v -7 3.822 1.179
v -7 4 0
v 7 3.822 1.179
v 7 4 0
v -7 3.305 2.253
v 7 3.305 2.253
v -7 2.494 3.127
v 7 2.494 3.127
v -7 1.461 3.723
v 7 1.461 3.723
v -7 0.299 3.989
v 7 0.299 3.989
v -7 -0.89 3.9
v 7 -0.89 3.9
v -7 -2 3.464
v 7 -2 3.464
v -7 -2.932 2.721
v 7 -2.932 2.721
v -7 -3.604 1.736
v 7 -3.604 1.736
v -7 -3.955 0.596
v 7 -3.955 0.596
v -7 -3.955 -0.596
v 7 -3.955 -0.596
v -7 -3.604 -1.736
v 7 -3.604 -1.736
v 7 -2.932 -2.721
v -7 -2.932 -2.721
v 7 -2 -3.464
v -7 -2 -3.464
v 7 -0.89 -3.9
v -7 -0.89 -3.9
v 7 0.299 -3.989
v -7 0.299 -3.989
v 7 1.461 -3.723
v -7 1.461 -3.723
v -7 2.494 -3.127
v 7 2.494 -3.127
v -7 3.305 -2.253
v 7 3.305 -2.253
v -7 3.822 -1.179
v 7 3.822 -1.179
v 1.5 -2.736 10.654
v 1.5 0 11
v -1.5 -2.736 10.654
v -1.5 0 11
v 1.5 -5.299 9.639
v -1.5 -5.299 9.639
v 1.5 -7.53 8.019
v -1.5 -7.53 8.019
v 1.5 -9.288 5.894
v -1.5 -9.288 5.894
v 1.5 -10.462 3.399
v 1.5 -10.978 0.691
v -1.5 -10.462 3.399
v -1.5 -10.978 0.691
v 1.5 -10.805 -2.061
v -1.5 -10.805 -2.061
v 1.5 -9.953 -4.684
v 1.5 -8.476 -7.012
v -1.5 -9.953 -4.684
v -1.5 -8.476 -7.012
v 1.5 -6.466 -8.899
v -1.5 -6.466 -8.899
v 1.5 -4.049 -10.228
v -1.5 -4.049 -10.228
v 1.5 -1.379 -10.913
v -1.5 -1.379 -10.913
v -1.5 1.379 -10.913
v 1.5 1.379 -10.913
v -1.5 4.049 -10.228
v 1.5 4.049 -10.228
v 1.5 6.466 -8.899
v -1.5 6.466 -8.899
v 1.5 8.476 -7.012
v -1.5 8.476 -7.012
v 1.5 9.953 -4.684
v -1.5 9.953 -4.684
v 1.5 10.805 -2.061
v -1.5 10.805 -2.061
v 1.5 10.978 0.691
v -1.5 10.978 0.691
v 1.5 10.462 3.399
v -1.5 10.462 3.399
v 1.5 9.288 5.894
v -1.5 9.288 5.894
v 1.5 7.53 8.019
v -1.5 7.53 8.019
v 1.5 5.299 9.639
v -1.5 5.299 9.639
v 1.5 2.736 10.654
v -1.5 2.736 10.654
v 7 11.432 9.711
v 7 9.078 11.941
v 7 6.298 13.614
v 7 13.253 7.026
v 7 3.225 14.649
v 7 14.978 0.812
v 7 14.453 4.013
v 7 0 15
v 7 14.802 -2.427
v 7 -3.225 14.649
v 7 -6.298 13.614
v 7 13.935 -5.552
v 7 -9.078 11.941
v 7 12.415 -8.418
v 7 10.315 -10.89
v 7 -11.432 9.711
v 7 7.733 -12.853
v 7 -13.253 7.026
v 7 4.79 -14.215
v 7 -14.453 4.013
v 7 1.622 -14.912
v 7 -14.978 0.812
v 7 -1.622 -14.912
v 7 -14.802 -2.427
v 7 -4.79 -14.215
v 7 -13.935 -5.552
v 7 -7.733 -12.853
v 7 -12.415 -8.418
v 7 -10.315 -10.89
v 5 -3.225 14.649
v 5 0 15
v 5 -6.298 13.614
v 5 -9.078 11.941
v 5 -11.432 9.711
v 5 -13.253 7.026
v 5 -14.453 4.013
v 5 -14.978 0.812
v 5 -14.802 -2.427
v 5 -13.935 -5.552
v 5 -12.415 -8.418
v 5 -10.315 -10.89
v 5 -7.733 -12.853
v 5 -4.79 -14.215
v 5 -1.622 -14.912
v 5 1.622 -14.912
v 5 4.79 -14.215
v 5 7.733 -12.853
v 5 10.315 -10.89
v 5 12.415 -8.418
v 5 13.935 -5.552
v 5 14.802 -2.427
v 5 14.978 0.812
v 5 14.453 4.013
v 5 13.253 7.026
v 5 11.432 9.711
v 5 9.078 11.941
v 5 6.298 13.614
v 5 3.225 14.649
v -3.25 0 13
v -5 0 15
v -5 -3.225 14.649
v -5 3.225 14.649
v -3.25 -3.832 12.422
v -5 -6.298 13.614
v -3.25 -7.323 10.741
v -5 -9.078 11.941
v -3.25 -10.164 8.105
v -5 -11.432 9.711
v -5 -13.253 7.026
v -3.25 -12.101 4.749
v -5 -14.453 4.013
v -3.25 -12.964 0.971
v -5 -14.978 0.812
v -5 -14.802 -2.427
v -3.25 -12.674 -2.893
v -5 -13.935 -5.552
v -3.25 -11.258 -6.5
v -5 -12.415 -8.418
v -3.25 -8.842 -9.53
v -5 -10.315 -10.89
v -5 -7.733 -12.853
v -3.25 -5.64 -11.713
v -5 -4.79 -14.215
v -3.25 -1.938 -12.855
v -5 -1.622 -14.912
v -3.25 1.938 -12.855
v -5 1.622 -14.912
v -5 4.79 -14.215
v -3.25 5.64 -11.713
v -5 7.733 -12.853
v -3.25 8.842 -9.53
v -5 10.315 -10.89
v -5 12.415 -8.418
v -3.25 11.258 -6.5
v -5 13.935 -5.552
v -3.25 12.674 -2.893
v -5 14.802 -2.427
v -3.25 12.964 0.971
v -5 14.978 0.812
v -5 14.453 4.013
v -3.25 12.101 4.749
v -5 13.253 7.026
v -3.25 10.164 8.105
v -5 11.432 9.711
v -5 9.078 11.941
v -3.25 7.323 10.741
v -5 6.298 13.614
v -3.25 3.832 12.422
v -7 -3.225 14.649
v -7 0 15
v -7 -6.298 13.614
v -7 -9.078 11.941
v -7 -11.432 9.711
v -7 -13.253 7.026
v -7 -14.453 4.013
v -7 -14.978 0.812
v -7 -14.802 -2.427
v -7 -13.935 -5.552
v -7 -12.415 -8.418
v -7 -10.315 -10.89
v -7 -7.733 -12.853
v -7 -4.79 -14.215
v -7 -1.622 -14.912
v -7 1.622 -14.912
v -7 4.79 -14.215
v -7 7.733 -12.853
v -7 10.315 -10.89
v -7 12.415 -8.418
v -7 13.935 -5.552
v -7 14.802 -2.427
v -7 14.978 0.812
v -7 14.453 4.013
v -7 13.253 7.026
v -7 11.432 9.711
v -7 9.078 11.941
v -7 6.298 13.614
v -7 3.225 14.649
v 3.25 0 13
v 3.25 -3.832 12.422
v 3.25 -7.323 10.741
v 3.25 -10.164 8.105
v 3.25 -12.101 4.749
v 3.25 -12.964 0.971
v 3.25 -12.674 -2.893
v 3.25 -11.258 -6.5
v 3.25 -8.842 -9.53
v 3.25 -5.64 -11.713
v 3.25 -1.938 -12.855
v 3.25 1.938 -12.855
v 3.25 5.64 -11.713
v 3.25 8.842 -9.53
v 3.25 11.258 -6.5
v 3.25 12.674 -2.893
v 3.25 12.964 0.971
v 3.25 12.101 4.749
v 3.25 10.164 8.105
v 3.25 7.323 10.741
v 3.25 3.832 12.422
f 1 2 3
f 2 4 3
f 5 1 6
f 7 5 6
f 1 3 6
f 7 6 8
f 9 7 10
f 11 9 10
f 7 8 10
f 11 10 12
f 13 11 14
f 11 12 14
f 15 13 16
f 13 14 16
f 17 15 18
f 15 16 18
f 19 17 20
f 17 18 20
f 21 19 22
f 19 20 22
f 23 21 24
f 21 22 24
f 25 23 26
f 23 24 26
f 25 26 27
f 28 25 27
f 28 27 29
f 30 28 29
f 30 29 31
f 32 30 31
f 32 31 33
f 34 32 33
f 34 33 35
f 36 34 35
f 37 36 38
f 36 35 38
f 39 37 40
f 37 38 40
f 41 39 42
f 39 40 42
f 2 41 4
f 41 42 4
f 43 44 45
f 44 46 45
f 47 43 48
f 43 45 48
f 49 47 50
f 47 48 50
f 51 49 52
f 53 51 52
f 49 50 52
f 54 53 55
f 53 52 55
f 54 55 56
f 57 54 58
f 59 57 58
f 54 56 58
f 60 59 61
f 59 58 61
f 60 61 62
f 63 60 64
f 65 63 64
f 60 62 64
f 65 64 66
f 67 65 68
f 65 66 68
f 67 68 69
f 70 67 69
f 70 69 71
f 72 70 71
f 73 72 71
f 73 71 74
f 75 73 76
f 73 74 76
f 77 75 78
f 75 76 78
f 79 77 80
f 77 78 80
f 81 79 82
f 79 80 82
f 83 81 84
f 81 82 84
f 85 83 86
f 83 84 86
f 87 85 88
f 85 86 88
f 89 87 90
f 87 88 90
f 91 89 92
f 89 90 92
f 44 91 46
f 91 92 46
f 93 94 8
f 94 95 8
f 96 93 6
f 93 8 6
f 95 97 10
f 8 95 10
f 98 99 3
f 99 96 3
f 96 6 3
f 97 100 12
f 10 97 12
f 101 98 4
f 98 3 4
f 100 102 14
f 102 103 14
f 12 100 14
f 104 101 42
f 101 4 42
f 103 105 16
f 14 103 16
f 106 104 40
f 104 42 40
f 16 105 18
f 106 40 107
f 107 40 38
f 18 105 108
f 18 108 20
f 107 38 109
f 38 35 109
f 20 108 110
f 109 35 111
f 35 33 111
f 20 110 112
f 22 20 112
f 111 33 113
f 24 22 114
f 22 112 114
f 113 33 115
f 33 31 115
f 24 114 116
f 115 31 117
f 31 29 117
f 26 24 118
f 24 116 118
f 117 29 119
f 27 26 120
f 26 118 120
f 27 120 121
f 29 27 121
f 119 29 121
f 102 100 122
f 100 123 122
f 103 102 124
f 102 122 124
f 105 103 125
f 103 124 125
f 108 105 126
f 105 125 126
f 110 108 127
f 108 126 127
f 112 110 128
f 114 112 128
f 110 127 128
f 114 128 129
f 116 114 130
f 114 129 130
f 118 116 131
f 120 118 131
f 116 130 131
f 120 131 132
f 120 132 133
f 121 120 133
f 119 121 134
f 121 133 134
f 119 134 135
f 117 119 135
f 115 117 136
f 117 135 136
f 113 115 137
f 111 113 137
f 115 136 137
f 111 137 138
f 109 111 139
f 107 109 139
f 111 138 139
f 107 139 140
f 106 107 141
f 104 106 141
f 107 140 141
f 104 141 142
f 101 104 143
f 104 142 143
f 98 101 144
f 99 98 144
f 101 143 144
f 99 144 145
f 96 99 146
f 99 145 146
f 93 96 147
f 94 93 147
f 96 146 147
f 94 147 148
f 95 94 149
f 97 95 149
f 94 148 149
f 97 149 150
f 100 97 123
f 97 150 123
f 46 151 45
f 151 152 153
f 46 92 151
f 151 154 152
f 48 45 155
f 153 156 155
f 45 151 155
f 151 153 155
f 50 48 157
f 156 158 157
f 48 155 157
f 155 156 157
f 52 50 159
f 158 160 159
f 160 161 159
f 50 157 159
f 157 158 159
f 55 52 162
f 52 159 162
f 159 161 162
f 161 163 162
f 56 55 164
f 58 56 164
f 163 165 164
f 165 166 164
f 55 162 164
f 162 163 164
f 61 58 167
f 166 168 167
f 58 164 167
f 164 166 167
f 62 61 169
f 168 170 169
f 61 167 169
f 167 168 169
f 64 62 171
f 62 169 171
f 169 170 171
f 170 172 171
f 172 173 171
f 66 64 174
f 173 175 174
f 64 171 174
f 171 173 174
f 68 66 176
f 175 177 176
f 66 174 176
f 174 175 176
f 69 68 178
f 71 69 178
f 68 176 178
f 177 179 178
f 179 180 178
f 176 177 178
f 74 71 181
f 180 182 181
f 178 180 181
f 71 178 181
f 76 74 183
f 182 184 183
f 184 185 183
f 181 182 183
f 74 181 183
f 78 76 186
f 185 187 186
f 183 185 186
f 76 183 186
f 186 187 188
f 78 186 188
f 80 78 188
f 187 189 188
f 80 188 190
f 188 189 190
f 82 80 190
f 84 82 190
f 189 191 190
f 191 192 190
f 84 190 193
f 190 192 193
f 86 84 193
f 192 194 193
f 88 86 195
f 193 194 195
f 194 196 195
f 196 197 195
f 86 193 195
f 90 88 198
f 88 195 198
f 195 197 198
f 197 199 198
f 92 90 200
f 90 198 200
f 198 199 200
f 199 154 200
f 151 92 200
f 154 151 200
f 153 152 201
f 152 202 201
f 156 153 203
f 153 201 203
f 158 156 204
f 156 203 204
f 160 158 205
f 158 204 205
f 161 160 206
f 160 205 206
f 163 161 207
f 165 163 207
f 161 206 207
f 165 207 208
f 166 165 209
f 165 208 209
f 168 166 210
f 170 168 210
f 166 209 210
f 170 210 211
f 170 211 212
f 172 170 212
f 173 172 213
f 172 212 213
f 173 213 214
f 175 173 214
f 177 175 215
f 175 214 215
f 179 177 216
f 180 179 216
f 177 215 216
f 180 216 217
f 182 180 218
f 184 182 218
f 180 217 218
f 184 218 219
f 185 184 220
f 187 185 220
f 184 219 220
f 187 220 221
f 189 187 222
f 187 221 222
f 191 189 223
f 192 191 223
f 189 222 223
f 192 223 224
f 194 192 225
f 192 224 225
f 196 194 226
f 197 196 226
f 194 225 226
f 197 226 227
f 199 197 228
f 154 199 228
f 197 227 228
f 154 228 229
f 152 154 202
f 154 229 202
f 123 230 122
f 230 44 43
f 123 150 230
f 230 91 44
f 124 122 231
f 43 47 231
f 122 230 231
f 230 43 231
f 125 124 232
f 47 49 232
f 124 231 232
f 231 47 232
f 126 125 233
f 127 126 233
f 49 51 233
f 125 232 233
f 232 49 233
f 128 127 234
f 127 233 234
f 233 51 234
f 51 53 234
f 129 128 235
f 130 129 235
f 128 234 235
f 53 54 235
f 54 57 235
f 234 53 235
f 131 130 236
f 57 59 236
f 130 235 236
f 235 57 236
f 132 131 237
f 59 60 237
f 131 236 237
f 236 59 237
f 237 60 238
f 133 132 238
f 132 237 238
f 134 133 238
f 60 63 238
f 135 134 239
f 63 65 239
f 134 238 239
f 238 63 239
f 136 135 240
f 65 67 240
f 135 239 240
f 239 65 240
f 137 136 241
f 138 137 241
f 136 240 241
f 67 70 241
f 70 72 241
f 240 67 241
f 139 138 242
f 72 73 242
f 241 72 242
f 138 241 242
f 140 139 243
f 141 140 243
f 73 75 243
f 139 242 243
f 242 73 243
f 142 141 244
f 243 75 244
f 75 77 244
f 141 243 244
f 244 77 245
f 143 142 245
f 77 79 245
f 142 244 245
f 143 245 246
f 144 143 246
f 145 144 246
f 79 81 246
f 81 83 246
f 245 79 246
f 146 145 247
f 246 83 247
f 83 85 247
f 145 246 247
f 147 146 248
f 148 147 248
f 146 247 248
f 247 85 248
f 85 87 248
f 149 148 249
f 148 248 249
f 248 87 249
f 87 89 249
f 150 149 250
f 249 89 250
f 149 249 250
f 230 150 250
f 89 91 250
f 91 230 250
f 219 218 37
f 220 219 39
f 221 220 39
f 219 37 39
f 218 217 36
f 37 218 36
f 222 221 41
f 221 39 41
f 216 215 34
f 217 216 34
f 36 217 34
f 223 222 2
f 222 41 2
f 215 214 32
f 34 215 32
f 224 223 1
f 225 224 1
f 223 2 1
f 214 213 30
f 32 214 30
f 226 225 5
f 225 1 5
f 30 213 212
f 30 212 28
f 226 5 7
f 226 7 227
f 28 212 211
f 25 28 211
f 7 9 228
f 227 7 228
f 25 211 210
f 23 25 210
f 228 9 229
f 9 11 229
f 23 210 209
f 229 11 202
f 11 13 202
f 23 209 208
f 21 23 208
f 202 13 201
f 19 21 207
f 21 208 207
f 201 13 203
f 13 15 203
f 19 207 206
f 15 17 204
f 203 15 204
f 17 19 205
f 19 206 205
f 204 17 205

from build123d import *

# Parameters (mm, degrees)
F1_R     = 4
F3_DEPTH = 12.5


with BuildPart() as f2:
    # F0 (on Front) → F2 (revolve)
    with BuildSketch(Plane.XZ):
        Polygon((0, 11), (0, 0), (7, 0), (7, 15), (5, 15), (1.5, 11), align=None)
        Polygon((-7, 0), (0, 0), (0, 11), (-1.5, 11), (-5, 15), (-7, 15), align=None)
    revolve(axis=Axis((0, 0, 0), (1, 0, 0)))

    # F1 (on Right) → F3 (cut, symmetric)
    with BuildSketch(Plane.YZ):
        Circle(F1_R)
    extrude(amount=F3_DEPTH, both=True, mode=Mode.SUBTRACT)


solid = f2.part
